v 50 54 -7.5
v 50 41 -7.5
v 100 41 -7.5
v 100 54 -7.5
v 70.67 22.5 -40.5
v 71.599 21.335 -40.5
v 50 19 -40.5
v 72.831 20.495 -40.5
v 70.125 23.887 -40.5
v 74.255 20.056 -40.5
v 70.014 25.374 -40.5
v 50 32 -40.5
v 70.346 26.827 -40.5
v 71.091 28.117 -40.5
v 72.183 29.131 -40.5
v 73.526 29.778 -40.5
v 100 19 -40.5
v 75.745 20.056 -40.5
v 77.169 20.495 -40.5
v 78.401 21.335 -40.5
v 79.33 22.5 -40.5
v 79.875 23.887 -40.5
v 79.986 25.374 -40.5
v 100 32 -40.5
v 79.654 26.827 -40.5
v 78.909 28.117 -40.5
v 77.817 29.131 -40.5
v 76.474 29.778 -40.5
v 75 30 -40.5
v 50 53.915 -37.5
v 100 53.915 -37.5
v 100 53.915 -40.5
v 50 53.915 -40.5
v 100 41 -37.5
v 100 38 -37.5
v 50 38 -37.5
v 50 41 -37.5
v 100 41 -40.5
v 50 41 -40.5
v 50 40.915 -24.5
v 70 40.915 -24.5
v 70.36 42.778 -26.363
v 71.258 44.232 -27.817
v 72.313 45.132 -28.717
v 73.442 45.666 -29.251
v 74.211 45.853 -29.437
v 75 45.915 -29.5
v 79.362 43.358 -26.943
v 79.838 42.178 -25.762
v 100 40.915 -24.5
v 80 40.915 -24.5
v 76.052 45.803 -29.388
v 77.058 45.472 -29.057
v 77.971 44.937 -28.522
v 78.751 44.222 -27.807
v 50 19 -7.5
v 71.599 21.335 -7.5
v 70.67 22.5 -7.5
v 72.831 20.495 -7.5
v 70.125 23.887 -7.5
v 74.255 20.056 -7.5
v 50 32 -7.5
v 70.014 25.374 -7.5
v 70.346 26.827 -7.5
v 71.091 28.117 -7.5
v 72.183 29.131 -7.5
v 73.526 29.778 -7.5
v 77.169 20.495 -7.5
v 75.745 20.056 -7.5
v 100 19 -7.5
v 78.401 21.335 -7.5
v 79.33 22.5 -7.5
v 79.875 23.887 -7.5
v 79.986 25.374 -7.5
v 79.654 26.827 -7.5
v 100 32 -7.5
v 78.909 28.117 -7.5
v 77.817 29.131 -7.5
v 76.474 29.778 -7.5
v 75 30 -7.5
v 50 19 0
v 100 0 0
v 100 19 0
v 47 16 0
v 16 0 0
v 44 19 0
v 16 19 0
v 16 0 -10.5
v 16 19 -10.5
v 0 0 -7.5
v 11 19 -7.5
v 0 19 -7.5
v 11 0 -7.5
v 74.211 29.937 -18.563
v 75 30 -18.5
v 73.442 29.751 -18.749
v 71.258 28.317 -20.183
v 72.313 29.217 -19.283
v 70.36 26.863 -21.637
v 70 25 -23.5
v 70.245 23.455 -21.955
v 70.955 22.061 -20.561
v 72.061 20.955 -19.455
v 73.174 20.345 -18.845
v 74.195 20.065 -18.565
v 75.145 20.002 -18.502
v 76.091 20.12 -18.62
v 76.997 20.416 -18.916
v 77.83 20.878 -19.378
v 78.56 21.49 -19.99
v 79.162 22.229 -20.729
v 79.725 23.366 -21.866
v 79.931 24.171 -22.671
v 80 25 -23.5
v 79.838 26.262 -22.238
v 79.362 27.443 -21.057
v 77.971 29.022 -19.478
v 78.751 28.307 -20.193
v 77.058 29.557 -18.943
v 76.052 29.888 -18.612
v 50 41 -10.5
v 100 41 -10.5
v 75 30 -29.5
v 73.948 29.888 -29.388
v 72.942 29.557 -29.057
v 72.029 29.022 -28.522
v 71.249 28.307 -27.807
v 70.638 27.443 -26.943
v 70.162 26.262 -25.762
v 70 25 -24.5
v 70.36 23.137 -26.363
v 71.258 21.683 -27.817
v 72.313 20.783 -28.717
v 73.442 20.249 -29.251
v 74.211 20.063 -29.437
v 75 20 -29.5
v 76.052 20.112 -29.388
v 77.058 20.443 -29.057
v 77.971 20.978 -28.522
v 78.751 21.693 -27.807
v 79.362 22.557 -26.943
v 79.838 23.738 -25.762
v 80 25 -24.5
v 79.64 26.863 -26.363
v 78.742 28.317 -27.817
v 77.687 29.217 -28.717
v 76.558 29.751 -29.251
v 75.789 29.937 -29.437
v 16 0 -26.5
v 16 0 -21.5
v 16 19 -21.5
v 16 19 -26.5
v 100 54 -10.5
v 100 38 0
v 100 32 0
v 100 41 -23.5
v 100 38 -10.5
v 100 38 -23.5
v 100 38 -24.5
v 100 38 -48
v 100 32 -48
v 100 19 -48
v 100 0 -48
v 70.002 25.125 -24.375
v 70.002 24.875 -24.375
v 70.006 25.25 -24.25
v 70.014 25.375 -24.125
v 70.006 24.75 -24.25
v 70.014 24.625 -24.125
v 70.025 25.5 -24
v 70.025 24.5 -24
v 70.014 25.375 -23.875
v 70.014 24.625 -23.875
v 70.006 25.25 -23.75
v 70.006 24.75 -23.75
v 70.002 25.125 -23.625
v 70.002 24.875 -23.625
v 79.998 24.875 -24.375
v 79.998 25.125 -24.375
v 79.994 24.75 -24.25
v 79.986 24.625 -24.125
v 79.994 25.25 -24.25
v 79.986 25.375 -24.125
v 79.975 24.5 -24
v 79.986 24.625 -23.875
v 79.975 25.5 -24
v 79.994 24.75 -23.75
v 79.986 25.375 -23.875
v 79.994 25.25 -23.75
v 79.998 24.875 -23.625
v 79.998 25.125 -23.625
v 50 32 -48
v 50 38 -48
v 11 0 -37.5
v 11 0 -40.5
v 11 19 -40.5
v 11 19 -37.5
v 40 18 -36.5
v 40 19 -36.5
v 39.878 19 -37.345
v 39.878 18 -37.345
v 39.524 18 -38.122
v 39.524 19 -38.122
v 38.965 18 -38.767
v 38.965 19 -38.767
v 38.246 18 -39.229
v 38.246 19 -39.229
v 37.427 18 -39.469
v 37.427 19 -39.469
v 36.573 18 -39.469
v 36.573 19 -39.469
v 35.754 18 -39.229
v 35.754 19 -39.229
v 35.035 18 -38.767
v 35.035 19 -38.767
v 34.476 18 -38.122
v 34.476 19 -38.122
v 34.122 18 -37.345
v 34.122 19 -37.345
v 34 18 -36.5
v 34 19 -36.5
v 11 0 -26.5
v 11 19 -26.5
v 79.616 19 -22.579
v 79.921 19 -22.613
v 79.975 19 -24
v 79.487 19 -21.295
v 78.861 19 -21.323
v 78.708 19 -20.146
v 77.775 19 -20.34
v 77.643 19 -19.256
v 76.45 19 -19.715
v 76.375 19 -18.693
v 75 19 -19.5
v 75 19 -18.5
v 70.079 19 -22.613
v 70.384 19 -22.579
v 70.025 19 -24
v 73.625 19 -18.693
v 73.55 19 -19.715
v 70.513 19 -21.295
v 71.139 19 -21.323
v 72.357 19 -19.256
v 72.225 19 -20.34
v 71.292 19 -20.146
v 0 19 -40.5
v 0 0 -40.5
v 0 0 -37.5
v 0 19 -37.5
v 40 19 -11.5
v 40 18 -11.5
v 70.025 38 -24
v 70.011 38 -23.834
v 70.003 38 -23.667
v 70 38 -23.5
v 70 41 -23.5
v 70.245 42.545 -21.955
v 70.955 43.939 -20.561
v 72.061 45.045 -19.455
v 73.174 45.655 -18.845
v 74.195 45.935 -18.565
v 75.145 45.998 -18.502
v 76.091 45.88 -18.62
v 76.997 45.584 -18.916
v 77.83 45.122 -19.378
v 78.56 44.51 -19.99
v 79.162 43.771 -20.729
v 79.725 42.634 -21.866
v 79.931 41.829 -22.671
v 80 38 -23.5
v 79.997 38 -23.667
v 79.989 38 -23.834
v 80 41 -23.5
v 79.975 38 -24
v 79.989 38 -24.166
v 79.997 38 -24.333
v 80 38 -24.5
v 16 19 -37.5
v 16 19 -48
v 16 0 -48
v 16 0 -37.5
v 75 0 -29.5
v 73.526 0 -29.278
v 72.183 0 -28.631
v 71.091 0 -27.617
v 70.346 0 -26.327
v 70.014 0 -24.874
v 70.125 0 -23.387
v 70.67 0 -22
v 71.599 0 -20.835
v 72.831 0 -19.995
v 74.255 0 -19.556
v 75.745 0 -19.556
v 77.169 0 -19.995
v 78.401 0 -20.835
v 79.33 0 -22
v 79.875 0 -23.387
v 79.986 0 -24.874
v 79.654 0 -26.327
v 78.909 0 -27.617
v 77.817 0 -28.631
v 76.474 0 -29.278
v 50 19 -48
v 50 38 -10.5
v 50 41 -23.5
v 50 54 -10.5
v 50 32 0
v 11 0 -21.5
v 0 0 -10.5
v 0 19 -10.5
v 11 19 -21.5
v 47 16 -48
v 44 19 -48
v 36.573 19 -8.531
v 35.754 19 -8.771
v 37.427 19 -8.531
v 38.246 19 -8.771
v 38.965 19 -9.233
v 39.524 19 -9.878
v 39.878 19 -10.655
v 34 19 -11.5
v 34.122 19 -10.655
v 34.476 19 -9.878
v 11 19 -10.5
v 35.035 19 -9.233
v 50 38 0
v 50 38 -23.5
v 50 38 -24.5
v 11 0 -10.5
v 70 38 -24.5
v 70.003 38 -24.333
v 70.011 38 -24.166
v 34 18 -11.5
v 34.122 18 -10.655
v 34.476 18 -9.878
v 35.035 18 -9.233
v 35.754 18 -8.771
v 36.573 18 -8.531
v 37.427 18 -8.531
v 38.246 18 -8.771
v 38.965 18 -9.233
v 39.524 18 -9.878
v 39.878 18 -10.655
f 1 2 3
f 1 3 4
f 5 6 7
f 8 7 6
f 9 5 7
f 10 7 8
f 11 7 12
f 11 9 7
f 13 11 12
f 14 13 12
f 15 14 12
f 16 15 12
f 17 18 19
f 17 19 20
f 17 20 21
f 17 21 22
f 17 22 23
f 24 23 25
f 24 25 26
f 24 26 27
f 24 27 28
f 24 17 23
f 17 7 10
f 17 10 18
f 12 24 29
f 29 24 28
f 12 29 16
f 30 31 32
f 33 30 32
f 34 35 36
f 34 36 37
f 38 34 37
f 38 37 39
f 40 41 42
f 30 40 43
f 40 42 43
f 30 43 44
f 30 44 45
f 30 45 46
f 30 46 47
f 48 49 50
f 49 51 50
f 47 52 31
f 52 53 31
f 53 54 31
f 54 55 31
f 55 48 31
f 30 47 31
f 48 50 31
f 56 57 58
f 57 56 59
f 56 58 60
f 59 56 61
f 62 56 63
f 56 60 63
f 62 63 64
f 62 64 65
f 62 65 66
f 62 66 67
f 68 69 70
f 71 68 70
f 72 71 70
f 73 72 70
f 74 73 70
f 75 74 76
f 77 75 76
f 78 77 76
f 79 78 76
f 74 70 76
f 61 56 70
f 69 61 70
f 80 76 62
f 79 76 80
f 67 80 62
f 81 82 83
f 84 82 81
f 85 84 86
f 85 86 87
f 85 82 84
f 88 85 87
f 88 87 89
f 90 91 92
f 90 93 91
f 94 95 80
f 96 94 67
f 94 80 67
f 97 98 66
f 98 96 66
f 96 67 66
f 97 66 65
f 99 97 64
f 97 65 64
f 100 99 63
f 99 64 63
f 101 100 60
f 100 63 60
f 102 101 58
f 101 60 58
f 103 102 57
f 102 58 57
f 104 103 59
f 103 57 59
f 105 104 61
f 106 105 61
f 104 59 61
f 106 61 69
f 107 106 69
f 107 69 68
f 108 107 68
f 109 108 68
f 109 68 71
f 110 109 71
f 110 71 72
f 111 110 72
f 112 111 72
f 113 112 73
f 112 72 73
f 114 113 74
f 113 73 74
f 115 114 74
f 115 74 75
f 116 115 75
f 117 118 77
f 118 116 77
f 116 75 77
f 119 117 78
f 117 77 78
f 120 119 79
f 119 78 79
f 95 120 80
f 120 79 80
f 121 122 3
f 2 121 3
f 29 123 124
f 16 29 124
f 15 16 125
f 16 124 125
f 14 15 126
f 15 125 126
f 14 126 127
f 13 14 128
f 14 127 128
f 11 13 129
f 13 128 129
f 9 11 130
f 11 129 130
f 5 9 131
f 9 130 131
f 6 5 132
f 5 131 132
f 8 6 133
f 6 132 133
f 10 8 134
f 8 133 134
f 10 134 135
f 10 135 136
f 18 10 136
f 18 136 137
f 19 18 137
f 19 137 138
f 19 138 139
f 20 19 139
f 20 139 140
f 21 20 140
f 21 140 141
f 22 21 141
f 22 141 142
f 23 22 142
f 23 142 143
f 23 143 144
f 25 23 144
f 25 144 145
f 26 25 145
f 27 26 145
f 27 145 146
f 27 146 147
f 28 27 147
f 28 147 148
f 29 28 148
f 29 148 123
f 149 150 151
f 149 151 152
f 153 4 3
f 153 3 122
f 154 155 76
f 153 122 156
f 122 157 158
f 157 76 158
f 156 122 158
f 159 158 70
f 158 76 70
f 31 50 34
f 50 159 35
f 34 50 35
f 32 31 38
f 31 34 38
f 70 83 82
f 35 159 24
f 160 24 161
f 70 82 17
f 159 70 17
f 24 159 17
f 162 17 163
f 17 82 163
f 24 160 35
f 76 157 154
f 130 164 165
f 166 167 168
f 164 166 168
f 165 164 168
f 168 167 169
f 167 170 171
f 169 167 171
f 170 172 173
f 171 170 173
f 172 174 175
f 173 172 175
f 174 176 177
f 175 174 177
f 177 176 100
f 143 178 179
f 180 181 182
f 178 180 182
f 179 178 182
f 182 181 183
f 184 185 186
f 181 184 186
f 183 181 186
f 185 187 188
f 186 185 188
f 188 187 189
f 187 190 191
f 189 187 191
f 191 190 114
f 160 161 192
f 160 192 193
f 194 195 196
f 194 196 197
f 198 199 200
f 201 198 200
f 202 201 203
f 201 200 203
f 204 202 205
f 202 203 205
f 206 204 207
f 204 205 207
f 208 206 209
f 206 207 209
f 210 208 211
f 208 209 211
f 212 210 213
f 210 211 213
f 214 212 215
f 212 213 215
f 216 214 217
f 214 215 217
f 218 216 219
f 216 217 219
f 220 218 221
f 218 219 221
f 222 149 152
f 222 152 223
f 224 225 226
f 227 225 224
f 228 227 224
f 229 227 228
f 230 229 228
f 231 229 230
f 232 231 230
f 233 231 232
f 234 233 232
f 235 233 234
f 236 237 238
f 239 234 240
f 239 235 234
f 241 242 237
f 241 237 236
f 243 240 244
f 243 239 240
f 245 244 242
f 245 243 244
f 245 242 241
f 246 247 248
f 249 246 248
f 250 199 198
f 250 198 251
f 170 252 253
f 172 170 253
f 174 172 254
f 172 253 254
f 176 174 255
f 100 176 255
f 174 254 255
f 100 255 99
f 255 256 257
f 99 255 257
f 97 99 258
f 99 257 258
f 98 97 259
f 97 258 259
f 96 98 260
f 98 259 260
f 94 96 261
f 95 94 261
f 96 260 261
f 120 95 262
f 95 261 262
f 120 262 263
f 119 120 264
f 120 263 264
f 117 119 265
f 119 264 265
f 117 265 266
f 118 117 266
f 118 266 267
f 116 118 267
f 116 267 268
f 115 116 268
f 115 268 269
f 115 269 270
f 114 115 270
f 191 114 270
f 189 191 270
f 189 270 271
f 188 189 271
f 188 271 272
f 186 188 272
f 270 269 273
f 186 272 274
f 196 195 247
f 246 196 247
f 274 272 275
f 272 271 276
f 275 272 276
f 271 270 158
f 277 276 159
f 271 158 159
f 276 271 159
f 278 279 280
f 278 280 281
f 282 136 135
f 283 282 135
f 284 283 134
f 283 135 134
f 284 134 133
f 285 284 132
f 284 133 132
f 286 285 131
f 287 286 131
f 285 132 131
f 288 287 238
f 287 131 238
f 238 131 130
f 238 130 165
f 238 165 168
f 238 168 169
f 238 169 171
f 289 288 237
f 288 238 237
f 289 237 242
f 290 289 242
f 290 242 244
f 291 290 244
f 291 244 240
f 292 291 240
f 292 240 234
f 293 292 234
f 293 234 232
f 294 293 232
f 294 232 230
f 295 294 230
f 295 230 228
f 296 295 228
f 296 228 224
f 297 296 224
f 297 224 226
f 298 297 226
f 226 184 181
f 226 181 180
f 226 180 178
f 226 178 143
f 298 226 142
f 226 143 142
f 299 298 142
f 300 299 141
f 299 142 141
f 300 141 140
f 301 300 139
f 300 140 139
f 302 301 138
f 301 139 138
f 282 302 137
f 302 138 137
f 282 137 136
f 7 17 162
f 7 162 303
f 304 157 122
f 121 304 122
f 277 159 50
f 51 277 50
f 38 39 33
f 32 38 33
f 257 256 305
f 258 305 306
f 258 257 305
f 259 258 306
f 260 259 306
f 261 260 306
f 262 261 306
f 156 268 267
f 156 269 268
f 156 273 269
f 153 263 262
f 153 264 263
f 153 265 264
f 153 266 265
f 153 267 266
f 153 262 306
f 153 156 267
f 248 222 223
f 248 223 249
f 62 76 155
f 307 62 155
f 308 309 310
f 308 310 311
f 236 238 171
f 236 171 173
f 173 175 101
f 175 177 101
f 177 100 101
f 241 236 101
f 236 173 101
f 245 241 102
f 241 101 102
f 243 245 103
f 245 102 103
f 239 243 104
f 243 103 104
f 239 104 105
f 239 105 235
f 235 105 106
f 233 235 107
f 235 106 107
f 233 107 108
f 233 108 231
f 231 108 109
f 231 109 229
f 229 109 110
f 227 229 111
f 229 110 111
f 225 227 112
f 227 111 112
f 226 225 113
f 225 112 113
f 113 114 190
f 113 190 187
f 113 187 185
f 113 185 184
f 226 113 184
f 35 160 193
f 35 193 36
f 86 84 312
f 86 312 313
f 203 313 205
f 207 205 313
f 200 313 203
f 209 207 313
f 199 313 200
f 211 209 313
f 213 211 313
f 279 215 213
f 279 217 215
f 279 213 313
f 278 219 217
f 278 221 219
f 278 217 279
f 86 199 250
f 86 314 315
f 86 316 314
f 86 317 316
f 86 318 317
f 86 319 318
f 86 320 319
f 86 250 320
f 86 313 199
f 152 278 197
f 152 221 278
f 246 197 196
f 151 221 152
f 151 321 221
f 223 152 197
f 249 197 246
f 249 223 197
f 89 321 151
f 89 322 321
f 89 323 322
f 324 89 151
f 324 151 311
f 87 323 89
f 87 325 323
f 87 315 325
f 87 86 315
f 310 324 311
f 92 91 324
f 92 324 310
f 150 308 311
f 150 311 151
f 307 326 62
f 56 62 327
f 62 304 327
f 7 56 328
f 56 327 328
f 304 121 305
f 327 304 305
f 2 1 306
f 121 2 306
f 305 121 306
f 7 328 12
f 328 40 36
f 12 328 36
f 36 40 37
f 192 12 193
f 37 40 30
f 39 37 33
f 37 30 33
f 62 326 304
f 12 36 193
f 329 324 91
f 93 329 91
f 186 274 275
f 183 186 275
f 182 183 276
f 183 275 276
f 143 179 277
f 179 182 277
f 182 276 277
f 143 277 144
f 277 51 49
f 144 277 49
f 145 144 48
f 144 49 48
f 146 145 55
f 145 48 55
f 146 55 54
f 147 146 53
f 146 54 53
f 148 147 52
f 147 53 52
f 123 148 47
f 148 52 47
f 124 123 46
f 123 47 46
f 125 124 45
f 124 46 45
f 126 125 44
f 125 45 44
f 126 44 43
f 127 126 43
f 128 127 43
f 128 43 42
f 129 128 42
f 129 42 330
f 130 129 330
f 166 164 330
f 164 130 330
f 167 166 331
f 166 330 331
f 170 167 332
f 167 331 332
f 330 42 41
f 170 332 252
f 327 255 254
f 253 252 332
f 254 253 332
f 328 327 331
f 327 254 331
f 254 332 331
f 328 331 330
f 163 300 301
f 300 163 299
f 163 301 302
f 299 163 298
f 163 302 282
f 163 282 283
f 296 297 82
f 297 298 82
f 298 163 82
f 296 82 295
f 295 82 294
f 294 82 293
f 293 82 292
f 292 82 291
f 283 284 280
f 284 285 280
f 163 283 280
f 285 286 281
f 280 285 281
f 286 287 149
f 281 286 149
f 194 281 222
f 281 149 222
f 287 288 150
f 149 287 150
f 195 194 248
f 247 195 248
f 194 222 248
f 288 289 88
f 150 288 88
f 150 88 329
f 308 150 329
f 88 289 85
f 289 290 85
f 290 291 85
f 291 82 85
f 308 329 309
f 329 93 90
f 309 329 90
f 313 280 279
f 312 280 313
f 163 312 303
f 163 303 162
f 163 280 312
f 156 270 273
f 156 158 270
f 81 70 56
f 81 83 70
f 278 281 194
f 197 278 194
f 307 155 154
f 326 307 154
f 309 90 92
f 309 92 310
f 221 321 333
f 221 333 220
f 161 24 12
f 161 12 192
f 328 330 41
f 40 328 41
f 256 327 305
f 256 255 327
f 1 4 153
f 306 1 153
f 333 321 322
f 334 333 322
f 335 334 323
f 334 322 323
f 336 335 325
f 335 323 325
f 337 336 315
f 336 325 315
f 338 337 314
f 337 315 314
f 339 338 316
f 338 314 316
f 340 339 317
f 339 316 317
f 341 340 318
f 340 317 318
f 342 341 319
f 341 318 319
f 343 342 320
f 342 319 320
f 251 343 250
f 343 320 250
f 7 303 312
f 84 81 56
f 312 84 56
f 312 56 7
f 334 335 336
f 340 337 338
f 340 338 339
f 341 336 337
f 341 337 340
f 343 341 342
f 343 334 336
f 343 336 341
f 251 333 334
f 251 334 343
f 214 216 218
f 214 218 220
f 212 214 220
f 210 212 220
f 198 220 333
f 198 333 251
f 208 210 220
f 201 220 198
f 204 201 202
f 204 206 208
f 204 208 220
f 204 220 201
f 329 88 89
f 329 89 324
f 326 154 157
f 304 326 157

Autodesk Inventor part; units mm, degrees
ref_plane "YZ Plane" through (0, 0, 0) normal (1, 0, 0) x (0, 1, 0)
ref_plane "XZ Plane" through (0, 0, 0) normal (0, 1, 0) x (-1, 0, 0)
ref_plane "XY Plane" through (0, 0, 0) normal (0, 0, 1) x (1, 0, 0)
sketch "Szkic1" plane through (0, 0, 0) normal (0, 1, 0) x (-1, 0, 0)
  line L0 (-100, 0) -> (-100, -48)
  line L1 (-11, -7.5) -> (0, -7.5)
  line L2 (-11, -40.5) -> (0, -40.5)
  line L3 (-16, 0) -> (-16, -10.5)
  line L4 (-16, -10.5) -> (-11, -10.5)
  line L5 (-16, -48) -> (-16, -37.5)
  line L6 (-16, -37.5) -> (-11, -37.5)
  line L7 (-11, -21.5) -> (-16, -21.5)
  line L8 (-16, -21.5) -> (-16, -26.5)
  line L9 (-16, -26.5) -> (-11, -26.5)
  line L10 (0, -7.5) -> (0, -14.4549)
  line L11 (0, -40.5) -> (0, -37.5)
  line L12 (0, -7.5) -> (0, -10.5)
  line L13 (0, -10.5) -> (-11, -21.5)
  line L14 (-11, -26.5) -> (0, -37.5)
  line L15 (-100, 0) -> (-100, -48)
  line L16 (-100, 0) -> (-16, 0)
  line L17 (-16, -10.5) -> (-16, 0)
  line L18 (-16, -10.5) -> (-11, -10.5)
  line L19 (-11, -10.5) -> (-11, -7.5)
  line L20 (-11, -7.5) -> (0, -7.5)
  line L21 (0, -7.5) -> (0, -10.5)
  line L22 (0, -10.5) -> (-11, -21.5)
  line L23 (-11, -21.5) -> (-16, -21.5)
  line L24 (-16, -21.5) -> (-16, -26.5)
  line L25 (-16, -26.5) -> (-11, -26.5)
  line L26 (-11, -26.5) -> (0, -37.5)
  line L27 (0, -37.5) -> (0, -40.5)
  line L28 (0, -40.5) -> (-11, -40.5)
  line L29 (-11, -40.5) -> (-11, -37.5)
  line L30 (-11, -37.5) -> (-16, -37.5)
  line L31 (-16, -37.5) -> (-16, -48)
  line L32 (-16, -48) -> (-100, -48)
  line L33 (-100, -48) -> (-100, 0)
  point P0 (0, 0)
  dimension "d1" = 48
  dimension "d2" = 11
  dimension "d5" = 5
  dimension "d6" = 10.5
  dimension "d7" = 10.5
  dimension "d8" = 5
  dimension "d10" = 11
  dimension "d11" = 5
  dimension "d12" = 5
  dimension "d15" = 3
  dimension "d16" = 3
  dimension "d77" = 90
ref_plane "Płaszczyzna konstrukcyjna8" through (100, 0, -48) normal (0, 0, -1) x (-1, 0, 0)
ref_plane "Płaszczyzna konstrukcyjna9" through (100, 0, 0) normal (1, 0, 0) x (0, 0, -1)
sketch "Szkic6" plane through (100, 0, 0) normal (1, 0, 0) x (0, 0, -1)
  line L0 (0, 19) -> (48, 19) projected
  line L1 (7.5, 19) -> (40.5, 19)
  line L2 (7.5, 19) -> (7.5, 32)
  line L3 (7.5, 32) -> (0, 32)
  line L4 (0, 32) -> (0, 38)
  line L5 (0, 38) -> (10.5, 38)
  line L6 (10.5, 38) -> (10.5, 41)
  line L7 (10.5, 41) -> (7.5, 41)
  line L8 (0, 0) -> (48, 0) projected
  line L9 (40.5, 19) -> (40.5, 32)
  line L10 (40.5, 32) -> (48, 32)
  line L11 (48, 32) -> (48, 38)
  line L12 (48, 38) -> (37.5, 38)
  line L13 (37.5, 38) -> (37.5, 41)
  line L14 (37.5, 41) -> (40.5, 41)
  line L15 (24.0424, 40.4576) -> (10.5, 54)
  line L16 (23.97, 39) -> (43.1219, 39) construction
  line L17 (24.0424, 40.4576) -> (37.5, 53.9152)
  line L18 (7.5, 41) -> (7.5, 52.5)
  line L19 (7.5, 54) -> (10.5, 54)
  line L20 (37.5, 53.9152) -> (40.5, 53.9152)
  line L21 (40.5, 52.4987) -> (40.5, 41)
  line L22 (23.5, 38) -> (24.5, 38)
  line L23 (23.5, 38) -> (23.5, 41)
  line L24 (24.5, 38) -> (24.5, 41)
  line L25 (7.5, 52.5) -> (7.5, 54)
  line L26 (40.5, 52.4987) -> (40.5, 53.9152)
  point P0 (10.5, 39.5)
  point P1 (24.5, 40.9152)
  point P2 (39, 53.9152)
  dimension "d27" = 33
  dimension "d28" = 7.5
  dimension "d30" = 10.5
  dimension "d32" = 38
  dimension "d33" = 6
  dimension "d36" = 10.5
  dimension "d49" = 3
  dimension "d50" = 3
  dimension "d51" = 135
  dimension "d52" = 1
  dimension "d54" = 3
  dimension "d55" = 13
  dimension "d56" = 3
  dimension "d57" = 3
  dimension "d74" = 53.9152
  dimension "d75" = 13
extrude "Wyciągnięcie proste4" add sketch "Szkic6" against normal blind 50 contours L2 L3 L4 L5 L6 L7 L18 L25 L19 L15 L23 L22 L24 L17 L20 L26 L21 L14 L13 L12 L11 L10 L9 L0
ref_plane "Płaszczyzna konstrukcyjna4" through (0, 0, 0) normal (0, -1, 0) x (1, 0, 0)
sketch "Szkic8" plane through (0, 0, 0) normal (0, -1, 0) x (1, 0, 0)
  line L0 (100, -23.5) -> (50, -23.5) projected
  point P0 (0, 0)
  point P1 (75, -23.5)
hole "Otwór1" at (75, 0, -23.5) direction (0, 1, 0) diameter 10 end through all
ref_plane "Płaszczyzna konstrukcyjna10" through (100, 19, -40.5) normal (0, 0, -1) x (-1, 0, 0)
sketch "Szkic9" plane through (100, 19, -40.5) normal (0, 0, -1) x (-1, 0, 0)
  line L0 (0, -19) -> (100, -19) projected
  point P0 (25, 6)
  point P1 (84, -19)
  dimension "d76" = 25
hole "Otwór2" at (75, 25, -40.5) direction (0, 0, 1) diameter 10 end through all
extrude "Wyciągnięcie proste5" add sketch "Szkic1" along normal blind 19
ref_plane "Płaszczyzna konstrukcyjna12" through (0, 19, 0) normal (0, 1, 0) x (1, 0, 0)
sketch "Szkic10" plane through (0, 19, 0) normal (0, 1, 0) x (1, 0, 0)
  line L0 (37, 36.5) -> (37, 11.5) construction
  line L1 (40, 36.5) -> (40, 11.5)
  line L2 (34, 11.5) -> (34, 36.5)
  arc A0 (40, 36.5) -> (34, 36.5) centre (37, 36.5) ccw
  arc A1 (34, 11.5) -> (40, 11.5) centre (37, 11.5) ccw
  line L3 (100, 57.6) -> (100, -9.6) projected
  line L4 (16, 0) -> (100, 0) projected
  point P0 (0, 0)
  point P1 (37, 24)
  dimension "d80" = 25
  dimension "d82" = 63
  dimension "d83" = 3
  dimension "d84" = 11.5
extrude "Wyciągnięcie proste6" cut sketch "Szkic10" against normal blind 1
sketch "Szkic11" plane through (16, 0, 0) normal (0, 0, 1) x (1, 0, 0)
  line L0 (34, 19) -> (31, 16)
  line L1 (31, 16) -> (28, 19)
  line L2 (28, 19) -> (34, 19)
  line L3 (84, 19) -> (0, 19) projected
  point P0 (-16, 0)
  dimension "d89" = 3
extrude "Wyciągnięcie proste7" cut sketch "Szkic11" against normal through all
sketch "Szkic12" plane through (0, 0, 0) normal (0, -1, 0) x (1, 0, 0)
  point P0 (0, 0)
  point P1 (75, -24.5)
hole "Otwór3" at (75, 0, -24.5) direction (0, 1, 0) diameter 10 end through all
